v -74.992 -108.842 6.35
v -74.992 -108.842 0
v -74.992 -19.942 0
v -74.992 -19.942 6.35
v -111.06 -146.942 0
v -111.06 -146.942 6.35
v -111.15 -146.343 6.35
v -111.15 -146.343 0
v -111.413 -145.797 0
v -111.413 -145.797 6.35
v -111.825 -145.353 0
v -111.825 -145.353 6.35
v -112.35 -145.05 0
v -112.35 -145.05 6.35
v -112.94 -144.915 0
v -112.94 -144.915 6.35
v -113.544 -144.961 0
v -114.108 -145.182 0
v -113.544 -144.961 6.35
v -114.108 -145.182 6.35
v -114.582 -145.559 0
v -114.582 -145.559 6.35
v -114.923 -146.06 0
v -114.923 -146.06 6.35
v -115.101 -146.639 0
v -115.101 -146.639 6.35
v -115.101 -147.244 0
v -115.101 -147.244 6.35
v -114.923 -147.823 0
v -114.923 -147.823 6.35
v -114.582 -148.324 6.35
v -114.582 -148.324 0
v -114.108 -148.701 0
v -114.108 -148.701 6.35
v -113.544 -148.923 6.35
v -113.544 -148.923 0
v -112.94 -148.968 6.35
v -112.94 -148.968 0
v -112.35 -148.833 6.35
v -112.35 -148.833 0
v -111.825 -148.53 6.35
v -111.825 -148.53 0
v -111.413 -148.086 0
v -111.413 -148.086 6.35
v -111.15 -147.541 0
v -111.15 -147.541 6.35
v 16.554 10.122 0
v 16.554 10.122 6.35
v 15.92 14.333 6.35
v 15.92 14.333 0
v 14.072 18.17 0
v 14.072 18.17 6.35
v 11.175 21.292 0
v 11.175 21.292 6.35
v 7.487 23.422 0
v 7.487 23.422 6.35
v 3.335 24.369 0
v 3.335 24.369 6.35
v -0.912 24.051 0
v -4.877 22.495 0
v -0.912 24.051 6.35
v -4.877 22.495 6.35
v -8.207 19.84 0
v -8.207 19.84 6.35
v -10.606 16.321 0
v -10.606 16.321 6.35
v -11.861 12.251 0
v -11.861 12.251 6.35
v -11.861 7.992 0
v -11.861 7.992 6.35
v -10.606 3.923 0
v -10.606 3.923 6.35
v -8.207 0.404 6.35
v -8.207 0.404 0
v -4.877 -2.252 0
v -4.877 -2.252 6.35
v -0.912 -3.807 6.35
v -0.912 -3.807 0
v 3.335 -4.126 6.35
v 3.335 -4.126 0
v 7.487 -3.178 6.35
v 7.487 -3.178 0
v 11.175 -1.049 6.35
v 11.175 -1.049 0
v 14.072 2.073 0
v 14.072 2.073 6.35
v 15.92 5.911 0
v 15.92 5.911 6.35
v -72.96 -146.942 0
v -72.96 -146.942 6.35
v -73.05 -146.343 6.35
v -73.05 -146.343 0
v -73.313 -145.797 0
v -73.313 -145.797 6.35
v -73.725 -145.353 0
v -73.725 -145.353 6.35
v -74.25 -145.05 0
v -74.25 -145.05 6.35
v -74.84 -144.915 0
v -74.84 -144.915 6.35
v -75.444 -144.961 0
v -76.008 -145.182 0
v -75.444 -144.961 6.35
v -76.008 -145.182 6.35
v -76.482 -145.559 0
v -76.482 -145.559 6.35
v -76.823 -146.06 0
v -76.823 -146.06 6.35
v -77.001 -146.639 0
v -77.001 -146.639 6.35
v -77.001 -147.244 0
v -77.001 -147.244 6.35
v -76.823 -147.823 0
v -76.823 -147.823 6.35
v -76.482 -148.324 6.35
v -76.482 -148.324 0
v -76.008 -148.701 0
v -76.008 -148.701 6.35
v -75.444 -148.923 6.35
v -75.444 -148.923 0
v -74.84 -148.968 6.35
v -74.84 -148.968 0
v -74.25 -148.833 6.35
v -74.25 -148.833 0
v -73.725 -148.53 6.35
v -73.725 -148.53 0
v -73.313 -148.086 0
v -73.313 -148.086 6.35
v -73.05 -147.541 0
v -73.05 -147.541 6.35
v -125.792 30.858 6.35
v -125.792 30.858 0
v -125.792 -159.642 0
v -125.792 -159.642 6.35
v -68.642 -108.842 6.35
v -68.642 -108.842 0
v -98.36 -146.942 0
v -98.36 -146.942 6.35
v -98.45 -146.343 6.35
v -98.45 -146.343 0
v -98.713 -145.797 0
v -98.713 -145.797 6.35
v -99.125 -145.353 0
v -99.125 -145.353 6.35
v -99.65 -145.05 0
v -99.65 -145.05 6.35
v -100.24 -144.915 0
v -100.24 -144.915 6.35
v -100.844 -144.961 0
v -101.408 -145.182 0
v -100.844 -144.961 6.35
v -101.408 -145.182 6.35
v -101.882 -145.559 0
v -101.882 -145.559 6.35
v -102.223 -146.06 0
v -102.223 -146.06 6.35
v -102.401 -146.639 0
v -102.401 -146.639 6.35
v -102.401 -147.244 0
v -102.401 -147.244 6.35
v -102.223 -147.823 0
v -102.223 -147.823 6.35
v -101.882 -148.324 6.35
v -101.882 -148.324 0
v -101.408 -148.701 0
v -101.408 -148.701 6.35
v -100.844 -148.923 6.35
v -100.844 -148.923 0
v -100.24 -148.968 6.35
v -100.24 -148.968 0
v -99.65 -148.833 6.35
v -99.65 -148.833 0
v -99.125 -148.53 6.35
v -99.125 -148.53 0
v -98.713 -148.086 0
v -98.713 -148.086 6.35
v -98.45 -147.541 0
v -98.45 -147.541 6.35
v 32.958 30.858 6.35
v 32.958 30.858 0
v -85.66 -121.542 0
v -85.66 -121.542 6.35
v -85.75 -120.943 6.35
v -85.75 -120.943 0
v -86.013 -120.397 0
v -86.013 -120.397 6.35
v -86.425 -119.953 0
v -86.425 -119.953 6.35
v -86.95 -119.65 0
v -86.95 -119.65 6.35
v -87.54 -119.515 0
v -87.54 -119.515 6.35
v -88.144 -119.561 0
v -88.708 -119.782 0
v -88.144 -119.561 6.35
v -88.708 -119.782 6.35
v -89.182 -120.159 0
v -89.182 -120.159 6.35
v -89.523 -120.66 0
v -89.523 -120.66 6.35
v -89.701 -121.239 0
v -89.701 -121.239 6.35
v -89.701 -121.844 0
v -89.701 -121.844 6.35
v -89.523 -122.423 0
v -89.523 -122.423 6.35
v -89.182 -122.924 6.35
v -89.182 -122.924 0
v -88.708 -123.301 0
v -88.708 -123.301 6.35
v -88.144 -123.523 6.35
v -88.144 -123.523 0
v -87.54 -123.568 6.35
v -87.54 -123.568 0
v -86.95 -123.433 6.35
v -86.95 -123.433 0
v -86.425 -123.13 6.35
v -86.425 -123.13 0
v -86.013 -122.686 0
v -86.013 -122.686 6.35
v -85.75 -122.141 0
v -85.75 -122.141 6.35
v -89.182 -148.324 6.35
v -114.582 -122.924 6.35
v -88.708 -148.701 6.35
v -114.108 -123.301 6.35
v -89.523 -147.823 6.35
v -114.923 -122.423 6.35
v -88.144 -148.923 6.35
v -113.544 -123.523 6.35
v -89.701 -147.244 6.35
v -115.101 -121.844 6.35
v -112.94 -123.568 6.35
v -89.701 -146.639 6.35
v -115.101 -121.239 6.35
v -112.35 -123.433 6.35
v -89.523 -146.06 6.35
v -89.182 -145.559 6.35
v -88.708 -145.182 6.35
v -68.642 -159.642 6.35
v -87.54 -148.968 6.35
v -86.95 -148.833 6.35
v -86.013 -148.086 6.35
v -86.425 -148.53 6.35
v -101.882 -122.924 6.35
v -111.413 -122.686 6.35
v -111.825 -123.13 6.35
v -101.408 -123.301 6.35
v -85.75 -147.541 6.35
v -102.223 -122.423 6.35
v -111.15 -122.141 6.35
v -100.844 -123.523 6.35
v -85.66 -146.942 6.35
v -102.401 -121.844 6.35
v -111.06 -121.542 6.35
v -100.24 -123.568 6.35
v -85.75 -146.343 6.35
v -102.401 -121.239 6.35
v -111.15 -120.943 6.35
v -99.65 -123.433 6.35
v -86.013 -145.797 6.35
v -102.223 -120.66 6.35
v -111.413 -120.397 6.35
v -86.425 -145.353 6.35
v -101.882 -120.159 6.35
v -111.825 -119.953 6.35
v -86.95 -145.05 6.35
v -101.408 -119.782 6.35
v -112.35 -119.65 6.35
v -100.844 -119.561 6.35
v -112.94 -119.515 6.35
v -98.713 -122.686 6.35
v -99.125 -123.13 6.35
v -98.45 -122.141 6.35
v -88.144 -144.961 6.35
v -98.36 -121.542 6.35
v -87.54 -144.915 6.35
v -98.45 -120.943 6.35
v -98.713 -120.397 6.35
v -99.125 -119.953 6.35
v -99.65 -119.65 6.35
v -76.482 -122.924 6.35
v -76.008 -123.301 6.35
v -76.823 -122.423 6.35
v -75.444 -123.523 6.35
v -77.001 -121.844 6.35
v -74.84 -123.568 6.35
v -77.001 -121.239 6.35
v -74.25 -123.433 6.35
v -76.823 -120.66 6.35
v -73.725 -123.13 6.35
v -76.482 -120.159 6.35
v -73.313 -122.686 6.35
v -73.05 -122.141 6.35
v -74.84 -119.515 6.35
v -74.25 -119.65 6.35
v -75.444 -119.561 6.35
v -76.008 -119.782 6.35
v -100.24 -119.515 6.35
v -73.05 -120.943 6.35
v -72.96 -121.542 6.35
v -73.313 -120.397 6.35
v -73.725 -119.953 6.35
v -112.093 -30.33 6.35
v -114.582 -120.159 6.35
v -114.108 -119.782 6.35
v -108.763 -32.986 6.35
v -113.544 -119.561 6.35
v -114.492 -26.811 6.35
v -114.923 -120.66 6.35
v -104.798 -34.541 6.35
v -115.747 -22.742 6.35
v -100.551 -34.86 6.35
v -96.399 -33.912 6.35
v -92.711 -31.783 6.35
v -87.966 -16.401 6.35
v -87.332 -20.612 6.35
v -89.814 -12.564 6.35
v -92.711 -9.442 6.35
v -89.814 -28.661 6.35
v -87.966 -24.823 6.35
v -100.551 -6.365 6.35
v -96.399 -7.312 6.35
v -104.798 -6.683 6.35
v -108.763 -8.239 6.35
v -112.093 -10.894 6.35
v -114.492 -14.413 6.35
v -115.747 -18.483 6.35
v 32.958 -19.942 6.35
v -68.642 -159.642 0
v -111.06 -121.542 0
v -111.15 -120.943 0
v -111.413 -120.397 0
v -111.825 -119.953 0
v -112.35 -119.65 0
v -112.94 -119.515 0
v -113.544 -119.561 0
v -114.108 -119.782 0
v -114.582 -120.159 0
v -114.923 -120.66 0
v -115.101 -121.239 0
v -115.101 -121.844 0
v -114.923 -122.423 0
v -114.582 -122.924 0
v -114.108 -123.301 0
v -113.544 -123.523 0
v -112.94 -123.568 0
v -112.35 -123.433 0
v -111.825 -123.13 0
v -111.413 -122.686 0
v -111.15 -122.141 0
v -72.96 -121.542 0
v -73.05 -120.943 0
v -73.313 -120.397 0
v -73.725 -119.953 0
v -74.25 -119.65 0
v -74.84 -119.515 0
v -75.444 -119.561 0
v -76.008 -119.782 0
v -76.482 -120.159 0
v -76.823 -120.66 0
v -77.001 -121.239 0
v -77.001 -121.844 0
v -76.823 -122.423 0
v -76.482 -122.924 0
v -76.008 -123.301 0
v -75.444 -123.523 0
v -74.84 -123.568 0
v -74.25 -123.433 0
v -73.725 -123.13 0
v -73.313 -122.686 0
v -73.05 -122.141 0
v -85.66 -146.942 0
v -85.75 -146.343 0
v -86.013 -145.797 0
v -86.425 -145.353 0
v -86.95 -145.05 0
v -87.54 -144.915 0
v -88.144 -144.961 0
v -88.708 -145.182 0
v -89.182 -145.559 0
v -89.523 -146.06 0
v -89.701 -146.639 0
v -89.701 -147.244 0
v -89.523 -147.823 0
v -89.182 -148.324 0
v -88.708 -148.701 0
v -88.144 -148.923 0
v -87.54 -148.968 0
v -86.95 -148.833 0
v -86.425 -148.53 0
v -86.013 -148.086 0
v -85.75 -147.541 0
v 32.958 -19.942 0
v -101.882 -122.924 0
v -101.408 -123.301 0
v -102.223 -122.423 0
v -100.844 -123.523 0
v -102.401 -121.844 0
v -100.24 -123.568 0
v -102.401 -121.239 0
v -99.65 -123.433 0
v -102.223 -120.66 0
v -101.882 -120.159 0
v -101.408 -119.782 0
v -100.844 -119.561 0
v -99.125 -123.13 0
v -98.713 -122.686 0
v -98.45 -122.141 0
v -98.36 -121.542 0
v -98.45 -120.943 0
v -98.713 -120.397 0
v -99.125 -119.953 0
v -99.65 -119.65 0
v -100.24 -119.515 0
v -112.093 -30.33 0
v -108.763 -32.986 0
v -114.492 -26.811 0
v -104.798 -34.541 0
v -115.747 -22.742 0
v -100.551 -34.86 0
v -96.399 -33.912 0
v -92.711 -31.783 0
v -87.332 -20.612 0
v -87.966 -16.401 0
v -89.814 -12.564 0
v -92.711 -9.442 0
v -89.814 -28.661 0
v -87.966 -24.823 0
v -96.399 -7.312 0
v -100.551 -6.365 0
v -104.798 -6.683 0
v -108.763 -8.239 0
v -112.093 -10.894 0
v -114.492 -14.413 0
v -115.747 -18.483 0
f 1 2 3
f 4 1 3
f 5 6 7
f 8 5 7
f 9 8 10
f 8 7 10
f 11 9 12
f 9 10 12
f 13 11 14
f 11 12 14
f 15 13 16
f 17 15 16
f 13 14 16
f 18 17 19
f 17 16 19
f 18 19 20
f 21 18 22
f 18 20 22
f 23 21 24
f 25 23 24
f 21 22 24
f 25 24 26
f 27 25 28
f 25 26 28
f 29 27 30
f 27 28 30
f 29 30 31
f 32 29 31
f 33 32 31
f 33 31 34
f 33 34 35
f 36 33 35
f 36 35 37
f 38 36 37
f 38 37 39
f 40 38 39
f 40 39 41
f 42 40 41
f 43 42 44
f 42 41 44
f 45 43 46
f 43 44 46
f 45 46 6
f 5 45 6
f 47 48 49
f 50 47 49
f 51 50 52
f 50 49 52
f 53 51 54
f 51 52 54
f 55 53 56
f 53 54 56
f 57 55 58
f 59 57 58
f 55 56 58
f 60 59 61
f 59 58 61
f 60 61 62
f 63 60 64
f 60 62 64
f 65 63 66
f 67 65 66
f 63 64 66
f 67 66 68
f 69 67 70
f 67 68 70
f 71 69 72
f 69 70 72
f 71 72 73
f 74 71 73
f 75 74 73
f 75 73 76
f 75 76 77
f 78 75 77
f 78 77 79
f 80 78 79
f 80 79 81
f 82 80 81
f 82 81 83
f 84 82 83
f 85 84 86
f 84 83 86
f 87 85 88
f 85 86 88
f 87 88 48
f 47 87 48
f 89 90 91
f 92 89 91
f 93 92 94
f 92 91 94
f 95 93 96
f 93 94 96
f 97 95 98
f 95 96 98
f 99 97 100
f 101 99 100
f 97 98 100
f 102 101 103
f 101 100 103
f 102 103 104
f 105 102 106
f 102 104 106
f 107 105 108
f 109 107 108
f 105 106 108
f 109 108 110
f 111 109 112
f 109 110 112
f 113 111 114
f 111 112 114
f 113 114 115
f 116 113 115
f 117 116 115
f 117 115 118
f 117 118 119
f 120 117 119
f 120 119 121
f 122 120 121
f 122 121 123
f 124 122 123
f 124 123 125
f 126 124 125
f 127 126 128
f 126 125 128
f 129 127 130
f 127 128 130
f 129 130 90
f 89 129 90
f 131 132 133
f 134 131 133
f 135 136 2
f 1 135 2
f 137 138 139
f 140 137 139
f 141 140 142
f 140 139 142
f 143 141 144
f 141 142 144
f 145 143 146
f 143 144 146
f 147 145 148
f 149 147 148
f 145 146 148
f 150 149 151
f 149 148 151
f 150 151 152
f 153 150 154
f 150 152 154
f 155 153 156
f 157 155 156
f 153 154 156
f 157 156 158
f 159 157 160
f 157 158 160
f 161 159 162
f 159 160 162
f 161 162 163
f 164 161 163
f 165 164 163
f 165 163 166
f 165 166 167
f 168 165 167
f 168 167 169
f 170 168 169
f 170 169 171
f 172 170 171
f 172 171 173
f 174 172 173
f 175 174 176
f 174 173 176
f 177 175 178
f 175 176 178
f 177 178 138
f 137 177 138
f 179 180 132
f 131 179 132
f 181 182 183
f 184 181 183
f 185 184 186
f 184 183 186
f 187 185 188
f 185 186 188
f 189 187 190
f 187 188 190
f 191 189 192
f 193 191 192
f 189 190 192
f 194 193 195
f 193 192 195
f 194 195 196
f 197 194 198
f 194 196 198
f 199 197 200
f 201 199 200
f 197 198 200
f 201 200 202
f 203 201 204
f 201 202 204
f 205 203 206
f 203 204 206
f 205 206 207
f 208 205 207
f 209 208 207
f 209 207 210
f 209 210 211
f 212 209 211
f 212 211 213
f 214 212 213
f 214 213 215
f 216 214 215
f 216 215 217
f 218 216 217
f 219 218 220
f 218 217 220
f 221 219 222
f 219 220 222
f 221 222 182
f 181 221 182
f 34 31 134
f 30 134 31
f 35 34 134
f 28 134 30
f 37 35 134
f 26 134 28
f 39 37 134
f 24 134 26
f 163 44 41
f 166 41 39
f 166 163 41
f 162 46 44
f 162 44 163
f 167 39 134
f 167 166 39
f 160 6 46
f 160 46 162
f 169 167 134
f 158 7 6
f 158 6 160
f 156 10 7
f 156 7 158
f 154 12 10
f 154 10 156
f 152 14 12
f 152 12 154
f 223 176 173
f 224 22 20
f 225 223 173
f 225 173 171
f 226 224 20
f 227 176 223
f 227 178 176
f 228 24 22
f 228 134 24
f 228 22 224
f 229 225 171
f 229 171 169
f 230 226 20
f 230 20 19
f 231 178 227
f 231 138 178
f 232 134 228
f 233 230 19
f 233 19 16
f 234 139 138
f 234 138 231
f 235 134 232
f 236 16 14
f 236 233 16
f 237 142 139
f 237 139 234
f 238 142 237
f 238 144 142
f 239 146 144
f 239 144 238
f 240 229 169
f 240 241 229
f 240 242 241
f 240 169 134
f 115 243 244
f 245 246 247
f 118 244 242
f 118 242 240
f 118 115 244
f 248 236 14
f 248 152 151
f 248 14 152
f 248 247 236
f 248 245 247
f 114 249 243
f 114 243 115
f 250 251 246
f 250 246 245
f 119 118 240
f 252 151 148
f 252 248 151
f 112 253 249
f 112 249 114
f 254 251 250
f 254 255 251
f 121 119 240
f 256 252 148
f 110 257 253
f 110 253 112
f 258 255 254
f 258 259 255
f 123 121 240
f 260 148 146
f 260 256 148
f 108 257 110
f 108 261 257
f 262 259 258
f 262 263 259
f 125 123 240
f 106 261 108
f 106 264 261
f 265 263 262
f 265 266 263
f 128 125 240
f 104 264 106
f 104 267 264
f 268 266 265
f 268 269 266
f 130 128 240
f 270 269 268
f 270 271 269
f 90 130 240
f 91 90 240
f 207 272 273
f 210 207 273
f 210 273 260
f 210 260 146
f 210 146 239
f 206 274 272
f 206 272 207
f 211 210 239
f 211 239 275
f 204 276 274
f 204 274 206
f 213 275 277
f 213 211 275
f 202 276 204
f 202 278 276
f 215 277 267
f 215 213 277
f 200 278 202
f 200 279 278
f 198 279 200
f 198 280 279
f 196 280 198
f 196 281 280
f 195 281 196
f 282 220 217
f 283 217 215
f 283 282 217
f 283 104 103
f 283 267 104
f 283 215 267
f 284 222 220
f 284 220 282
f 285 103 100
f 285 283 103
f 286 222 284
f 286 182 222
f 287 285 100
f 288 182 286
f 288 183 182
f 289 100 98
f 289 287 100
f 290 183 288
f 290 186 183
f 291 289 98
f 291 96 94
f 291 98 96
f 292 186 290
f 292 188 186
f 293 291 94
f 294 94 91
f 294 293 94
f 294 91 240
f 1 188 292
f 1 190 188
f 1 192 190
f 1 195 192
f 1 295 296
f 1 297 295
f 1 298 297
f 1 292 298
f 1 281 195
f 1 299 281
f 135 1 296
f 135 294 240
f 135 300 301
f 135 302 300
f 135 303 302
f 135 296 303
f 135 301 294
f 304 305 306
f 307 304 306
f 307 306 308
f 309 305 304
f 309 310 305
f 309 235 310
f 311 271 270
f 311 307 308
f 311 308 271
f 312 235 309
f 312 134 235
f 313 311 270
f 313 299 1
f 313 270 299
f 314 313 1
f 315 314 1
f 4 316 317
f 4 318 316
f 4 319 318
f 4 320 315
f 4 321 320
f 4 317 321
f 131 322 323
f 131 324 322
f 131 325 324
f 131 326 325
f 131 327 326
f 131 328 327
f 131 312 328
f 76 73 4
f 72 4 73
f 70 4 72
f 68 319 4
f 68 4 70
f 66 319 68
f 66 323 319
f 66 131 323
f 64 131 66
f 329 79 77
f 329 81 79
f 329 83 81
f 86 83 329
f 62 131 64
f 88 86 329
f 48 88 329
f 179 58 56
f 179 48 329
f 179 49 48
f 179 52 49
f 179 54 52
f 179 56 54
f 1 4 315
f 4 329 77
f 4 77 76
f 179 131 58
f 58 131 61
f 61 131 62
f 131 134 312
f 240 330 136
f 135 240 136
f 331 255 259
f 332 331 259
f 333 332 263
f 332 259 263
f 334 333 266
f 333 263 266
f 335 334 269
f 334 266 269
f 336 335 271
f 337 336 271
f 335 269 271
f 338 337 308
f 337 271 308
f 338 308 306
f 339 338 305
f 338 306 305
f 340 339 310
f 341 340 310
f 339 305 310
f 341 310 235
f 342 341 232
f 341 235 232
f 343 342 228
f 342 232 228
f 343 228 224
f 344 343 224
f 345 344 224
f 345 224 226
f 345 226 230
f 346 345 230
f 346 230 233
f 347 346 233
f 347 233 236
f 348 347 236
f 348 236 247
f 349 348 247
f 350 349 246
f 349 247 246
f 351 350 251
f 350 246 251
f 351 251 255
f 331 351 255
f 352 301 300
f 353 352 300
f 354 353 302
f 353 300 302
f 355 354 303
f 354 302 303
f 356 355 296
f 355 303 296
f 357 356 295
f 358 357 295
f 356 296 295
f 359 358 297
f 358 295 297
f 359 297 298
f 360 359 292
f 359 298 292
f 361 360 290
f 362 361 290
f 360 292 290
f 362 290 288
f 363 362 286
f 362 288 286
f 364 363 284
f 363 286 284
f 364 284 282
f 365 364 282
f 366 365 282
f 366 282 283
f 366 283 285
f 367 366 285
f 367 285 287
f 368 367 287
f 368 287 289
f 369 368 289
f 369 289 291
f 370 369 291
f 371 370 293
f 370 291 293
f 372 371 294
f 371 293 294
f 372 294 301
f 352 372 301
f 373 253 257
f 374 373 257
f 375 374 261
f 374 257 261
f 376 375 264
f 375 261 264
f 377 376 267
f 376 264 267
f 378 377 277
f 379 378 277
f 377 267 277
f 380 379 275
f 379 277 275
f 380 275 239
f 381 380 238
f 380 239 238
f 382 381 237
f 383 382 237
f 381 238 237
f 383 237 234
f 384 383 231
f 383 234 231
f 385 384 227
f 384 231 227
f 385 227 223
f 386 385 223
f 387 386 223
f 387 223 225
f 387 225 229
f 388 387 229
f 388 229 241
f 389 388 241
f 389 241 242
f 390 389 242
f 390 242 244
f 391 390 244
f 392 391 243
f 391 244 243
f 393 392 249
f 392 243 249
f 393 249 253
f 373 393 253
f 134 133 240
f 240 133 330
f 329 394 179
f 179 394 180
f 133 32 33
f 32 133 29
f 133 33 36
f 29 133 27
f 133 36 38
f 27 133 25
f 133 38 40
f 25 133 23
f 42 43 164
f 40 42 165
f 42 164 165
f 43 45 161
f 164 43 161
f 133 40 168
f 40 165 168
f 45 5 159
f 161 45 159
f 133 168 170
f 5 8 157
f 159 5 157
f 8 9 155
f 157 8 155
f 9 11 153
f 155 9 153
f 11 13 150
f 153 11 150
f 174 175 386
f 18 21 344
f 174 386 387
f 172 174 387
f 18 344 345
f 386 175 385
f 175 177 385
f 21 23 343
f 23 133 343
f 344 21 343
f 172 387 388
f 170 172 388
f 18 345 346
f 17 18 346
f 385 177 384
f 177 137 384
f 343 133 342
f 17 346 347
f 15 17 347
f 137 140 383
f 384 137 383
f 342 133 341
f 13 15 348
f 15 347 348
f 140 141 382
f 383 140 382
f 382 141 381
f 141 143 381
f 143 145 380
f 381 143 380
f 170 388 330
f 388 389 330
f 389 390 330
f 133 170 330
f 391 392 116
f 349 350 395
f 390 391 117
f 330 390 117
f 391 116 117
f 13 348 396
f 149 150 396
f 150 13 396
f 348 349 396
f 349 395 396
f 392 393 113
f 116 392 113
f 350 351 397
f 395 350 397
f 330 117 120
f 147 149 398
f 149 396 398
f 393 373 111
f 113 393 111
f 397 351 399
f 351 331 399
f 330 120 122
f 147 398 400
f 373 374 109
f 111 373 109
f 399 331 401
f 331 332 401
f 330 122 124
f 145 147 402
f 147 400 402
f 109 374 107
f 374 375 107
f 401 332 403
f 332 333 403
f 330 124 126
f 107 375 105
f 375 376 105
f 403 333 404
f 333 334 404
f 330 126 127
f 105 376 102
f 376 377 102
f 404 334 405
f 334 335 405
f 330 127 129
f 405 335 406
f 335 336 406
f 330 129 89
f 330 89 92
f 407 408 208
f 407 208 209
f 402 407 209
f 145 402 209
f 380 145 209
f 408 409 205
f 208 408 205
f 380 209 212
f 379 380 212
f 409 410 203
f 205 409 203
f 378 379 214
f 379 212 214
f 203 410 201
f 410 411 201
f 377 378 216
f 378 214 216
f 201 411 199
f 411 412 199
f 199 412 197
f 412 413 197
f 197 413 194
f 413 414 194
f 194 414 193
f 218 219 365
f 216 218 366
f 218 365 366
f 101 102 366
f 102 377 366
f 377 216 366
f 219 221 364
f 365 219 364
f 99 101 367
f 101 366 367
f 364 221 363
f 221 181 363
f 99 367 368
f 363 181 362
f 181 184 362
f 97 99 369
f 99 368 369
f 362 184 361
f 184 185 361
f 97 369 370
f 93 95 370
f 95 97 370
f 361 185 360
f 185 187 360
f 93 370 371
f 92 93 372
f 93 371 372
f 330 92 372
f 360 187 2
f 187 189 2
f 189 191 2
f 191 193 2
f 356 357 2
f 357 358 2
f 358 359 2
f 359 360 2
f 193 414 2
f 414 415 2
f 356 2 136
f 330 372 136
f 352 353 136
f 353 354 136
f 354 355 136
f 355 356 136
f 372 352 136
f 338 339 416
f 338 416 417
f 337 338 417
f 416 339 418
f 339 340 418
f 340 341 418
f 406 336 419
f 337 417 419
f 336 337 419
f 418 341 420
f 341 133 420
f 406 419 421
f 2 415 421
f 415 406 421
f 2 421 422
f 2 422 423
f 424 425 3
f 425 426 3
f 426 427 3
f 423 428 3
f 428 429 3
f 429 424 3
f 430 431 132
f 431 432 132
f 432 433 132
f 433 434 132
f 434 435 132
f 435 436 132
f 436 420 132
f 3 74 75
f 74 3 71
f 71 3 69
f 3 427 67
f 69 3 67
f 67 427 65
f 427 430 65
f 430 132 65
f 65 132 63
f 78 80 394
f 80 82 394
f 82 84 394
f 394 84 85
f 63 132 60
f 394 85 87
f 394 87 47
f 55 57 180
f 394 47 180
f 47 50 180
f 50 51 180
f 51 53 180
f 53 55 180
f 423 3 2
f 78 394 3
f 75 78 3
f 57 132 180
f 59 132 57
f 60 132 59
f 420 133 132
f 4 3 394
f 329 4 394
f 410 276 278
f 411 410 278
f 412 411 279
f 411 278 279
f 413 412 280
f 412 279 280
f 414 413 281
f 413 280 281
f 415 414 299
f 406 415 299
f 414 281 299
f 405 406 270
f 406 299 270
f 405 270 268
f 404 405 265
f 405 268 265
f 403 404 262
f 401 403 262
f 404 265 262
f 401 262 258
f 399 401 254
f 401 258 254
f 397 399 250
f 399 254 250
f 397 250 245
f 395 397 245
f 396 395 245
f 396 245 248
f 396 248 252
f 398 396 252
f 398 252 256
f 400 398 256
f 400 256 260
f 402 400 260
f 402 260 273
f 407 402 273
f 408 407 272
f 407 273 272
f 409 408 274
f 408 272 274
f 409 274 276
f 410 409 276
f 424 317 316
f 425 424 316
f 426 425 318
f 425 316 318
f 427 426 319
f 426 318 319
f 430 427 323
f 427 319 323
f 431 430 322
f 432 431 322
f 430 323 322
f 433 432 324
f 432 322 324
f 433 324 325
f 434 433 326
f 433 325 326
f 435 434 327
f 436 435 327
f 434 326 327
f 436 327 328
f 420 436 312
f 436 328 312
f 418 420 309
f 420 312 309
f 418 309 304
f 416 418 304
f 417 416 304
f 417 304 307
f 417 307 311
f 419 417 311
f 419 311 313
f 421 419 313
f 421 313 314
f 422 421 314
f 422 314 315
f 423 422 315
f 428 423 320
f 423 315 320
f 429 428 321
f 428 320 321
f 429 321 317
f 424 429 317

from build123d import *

# Parameters (mm, degrees)
BOSS_EXTRUDE1_DEPTH = 6.35
SKETCH3_R           = 14.2875
SKETCH3_R_2         = 2.032
CUT_EXTRUDE1_DEPTH  = 6.35


with BuildPart() as part:
    # Sketch2 → Boss-Extrude1 (new body)
    with BuildSketch(Plane.XY):
        Polygon((-125.79203122, -159.641560721), (-74.99203122, -159.641560721), (-68.64203122, -159.641560721), (-68.64203122, -108.841560721), (-74.99203122, -108.841560721), (-74.99203122, -19.941560721), (32.95796878, -19.941560721), (32.95796878, 30.858439279), (-125.79203122, 30.858439279), (-125.79203122, -140.591560721), align=None)
    extrude(amount=BOSS_EXTRUDE1_DEPTH)

    # Sketch3 → Cut-Extrude1 (cut)
    with BuildSketch(Plane.XY.offset(6.35)):
        with Locations((-101.619115086, -20.612163927)):
            Circle(SKETCH3_R)
        with Locations((2.266884914, 10.121836073)):
            Circle(SKETCH3_R)
        with Locations((-87.69203122, -146.941560721)):
            Circle(SKETCH3_R_2)
        with Locations((-113.09203122, -146.941560721)):
            Circle(SKETCH3_R_2)
        with Locations((-100.39203122, -146.941560721)):
            Circle(SKETCH3_R_2)
        with Locations((-74.99203122, -146.941560721)):
            Circle(SKETCH3_R_2)
        with Locations((-113.09203122, -121.541560721)):
            Circle(SKETCH3_R_2)
        with Locations((-87.69203122, -121.541560721)):
            Circle(SKETCH3_R_2)
        with Locations((-74.99203122, -121.541560721)):
            Circle(SKETCH3_R_2)
        with Locations((-100.39203122, -121.541560721)):
            Circle(SKETCH3_R_2)
    extrude(amount=-CUT_EXTRUDE1_DEPTH, mode=Mode.SUBTRACT)


solid = part.part
